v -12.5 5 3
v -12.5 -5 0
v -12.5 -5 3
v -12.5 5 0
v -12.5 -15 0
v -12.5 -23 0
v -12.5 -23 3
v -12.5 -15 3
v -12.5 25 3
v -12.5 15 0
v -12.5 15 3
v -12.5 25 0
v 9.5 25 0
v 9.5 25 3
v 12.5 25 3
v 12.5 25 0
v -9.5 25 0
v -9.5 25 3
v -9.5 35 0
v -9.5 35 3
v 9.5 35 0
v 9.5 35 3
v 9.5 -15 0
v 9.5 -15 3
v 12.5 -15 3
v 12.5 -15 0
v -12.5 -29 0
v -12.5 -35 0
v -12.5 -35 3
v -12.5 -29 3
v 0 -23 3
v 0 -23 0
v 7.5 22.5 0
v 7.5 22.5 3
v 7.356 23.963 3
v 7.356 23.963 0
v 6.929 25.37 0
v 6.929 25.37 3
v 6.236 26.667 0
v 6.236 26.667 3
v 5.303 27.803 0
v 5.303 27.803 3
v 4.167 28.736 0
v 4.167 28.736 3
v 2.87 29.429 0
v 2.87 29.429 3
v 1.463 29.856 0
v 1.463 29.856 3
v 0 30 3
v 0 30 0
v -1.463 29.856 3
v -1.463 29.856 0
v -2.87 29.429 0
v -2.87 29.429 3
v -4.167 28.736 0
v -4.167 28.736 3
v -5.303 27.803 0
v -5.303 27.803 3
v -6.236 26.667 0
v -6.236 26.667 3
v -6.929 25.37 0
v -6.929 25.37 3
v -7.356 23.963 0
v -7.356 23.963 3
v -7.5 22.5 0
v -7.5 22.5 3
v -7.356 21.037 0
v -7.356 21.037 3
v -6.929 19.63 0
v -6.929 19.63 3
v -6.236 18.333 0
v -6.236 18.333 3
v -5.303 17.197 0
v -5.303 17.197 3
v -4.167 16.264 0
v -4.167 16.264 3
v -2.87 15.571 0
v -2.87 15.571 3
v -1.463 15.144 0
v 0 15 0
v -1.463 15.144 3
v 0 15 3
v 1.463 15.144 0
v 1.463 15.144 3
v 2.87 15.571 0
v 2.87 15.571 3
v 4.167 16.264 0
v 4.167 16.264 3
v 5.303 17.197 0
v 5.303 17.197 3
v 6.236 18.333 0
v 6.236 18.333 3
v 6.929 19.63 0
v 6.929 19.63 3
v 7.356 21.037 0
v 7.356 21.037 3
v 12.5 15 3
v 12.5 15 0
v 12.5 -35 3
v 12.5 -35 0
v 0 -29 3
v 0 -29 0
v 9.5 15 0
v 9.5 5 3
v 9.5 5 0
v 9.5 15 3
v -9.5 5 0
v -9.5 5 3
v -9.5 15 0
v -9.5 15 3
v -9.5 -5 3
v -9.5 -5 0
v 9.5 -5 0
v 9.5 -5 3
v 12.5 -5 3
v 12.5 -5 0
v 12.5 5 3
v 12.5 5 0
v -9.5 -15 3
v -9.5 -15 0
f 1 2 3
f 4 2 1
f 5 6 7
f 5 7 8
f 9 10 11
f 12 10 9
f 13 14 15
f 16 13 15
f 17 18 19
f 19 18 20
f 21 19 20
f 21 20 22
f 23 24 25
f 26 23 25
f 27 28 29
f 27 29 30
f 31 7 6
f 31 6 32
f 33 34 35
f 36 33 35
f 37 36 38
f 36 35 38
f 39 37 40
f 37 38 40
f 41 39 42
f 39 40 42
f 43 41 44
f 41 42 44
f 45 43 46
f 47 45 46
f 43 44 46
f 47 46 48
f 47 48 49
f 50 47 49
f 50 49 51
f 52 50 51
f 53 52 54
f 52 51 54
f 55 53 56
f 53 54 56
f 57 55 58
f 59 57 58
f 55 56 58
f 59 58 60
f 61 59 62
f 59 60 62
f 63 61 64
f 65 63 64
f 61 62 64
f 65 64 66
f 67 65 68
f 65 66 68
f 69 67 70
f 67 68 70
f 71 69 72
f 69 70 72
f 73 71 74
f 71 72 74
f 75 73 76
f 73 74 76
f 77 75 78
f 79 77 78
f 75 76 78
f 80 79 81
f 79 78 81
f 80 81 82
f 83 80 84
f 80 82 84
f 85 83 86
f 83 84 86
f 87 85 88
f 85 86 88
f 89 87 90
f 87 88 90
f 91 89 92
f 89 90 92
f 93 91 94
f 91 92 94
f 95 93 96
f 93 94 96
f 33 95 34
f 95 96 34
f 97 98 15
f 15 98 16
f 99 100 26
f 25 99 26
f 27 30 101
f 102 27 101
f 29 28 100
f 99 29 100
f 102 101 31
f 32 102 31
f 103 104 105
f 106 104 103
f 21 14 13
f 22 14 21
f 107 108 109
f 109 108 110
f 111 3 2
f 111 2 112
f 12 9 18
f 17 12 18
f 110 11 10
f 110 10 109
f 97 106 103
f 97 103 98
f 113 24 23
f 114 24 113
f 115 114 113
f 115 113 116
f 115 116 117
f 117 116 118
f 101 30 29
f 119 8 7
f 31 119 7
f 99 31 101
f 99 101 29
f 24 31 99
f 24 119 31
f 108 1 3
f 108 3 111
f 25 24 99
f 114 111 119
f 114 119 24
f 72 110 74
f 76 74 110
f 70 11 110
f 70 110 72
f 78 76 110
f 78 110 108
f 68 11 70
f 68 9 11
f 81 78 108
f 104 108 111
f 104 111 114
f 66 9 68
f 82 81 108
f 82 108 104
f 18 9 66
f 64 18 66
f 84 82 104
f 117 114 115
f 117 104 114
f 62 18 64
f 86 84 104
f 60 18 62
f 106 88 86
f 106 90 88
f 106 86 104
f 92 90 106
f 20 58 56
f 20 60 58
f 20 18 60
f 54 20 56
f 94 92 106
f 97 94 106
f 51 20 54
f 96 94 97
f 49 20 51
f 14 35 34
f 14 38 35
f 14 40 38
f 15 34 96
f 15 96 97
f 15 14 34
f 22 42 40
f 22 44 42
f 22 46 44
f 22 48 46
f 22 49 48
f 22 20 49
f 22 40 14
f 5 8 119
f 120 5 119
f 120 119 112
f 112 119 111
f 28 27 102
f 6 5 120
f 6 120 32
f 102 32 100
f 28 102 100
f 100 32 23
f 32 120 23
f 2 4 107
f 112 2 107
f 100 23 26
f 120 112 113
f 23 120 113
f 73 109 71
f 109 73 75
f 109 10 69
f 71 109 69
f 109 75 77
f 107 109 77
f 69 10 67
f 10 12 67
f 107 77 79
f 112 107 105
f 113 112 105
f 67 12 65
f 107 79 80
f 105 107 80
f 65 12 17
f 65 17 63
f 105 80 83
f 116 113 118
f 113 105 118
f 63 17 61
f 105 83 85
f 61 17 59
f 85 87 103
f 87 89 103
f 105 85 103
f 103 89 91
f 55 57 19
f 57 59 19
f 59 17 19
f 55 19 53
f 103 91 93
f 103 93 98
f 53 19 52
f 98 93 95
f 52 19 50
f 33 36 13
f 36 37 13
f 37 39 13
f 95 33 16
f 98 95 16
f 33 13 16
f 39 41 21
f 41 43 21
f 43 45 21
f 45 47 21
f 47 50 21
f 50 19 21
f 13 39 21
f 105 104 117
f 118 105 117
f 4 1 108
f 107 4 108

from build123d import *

# Parameters (mm, degrees)
SKETCH1_W           = 25
SKETCH1_H           = 70
BOSS_EXTRUDE1_DEPTH = 3
SKETCH2_R           = 7.5
SKETCH2_W           = 3
SKETCH2_H           = 10
SKETCH2_W_2         = 12.5
SKETCH2_H_2         = 6
CUT_EXTRUDE1_DEPTH  = 3


with BuildPart() as part:
    # Sketch1 → Boss-Extrude1 (new body)
    with BuildSketch(Plane.XY):
        Rectangle(SKETCH1_W, SKETCH1_H)
    extrude(amount=BOSS_EXTRUDE1_DEPTH)

    # Sketch2 → Cut-Extrude1 (cut)
    with BuildSketch(Plane.XY.offset(3)):
        with Locations((0, 22.5)):
            Circle(SKETCH2_R)
        with Locations((-11, -10)):
            Rectangle(SKETCH2_W, SKETCH2_H)
        with Locations((11, 30)):
            Rectangle(SKETCH2_W, SKETCH2_H)
        with Locations((11, 10)):
            Rectangle(SKETCH2_W, SKETCH2_H)
        with Locations((11, -10)):
            Rectangle(SKETCH2_W, SKETCH2_H)
        with Locations((-11, 10)):
            Rectangle(SKETCH2_W, SKETCH2_H)
        with Locations((-11, 30)):
            Rectangle(SKETCH2_W, SKETCH2_H)
        with Locations((-6.25, -26)):
            Rectangle(SKETCH2_W_2, SKETCH2_H_2)
    extrude(amount=-CUT_EXTRUDE1_DEPTH, mode=Mode.SUBTRACT)


solid = part.part
